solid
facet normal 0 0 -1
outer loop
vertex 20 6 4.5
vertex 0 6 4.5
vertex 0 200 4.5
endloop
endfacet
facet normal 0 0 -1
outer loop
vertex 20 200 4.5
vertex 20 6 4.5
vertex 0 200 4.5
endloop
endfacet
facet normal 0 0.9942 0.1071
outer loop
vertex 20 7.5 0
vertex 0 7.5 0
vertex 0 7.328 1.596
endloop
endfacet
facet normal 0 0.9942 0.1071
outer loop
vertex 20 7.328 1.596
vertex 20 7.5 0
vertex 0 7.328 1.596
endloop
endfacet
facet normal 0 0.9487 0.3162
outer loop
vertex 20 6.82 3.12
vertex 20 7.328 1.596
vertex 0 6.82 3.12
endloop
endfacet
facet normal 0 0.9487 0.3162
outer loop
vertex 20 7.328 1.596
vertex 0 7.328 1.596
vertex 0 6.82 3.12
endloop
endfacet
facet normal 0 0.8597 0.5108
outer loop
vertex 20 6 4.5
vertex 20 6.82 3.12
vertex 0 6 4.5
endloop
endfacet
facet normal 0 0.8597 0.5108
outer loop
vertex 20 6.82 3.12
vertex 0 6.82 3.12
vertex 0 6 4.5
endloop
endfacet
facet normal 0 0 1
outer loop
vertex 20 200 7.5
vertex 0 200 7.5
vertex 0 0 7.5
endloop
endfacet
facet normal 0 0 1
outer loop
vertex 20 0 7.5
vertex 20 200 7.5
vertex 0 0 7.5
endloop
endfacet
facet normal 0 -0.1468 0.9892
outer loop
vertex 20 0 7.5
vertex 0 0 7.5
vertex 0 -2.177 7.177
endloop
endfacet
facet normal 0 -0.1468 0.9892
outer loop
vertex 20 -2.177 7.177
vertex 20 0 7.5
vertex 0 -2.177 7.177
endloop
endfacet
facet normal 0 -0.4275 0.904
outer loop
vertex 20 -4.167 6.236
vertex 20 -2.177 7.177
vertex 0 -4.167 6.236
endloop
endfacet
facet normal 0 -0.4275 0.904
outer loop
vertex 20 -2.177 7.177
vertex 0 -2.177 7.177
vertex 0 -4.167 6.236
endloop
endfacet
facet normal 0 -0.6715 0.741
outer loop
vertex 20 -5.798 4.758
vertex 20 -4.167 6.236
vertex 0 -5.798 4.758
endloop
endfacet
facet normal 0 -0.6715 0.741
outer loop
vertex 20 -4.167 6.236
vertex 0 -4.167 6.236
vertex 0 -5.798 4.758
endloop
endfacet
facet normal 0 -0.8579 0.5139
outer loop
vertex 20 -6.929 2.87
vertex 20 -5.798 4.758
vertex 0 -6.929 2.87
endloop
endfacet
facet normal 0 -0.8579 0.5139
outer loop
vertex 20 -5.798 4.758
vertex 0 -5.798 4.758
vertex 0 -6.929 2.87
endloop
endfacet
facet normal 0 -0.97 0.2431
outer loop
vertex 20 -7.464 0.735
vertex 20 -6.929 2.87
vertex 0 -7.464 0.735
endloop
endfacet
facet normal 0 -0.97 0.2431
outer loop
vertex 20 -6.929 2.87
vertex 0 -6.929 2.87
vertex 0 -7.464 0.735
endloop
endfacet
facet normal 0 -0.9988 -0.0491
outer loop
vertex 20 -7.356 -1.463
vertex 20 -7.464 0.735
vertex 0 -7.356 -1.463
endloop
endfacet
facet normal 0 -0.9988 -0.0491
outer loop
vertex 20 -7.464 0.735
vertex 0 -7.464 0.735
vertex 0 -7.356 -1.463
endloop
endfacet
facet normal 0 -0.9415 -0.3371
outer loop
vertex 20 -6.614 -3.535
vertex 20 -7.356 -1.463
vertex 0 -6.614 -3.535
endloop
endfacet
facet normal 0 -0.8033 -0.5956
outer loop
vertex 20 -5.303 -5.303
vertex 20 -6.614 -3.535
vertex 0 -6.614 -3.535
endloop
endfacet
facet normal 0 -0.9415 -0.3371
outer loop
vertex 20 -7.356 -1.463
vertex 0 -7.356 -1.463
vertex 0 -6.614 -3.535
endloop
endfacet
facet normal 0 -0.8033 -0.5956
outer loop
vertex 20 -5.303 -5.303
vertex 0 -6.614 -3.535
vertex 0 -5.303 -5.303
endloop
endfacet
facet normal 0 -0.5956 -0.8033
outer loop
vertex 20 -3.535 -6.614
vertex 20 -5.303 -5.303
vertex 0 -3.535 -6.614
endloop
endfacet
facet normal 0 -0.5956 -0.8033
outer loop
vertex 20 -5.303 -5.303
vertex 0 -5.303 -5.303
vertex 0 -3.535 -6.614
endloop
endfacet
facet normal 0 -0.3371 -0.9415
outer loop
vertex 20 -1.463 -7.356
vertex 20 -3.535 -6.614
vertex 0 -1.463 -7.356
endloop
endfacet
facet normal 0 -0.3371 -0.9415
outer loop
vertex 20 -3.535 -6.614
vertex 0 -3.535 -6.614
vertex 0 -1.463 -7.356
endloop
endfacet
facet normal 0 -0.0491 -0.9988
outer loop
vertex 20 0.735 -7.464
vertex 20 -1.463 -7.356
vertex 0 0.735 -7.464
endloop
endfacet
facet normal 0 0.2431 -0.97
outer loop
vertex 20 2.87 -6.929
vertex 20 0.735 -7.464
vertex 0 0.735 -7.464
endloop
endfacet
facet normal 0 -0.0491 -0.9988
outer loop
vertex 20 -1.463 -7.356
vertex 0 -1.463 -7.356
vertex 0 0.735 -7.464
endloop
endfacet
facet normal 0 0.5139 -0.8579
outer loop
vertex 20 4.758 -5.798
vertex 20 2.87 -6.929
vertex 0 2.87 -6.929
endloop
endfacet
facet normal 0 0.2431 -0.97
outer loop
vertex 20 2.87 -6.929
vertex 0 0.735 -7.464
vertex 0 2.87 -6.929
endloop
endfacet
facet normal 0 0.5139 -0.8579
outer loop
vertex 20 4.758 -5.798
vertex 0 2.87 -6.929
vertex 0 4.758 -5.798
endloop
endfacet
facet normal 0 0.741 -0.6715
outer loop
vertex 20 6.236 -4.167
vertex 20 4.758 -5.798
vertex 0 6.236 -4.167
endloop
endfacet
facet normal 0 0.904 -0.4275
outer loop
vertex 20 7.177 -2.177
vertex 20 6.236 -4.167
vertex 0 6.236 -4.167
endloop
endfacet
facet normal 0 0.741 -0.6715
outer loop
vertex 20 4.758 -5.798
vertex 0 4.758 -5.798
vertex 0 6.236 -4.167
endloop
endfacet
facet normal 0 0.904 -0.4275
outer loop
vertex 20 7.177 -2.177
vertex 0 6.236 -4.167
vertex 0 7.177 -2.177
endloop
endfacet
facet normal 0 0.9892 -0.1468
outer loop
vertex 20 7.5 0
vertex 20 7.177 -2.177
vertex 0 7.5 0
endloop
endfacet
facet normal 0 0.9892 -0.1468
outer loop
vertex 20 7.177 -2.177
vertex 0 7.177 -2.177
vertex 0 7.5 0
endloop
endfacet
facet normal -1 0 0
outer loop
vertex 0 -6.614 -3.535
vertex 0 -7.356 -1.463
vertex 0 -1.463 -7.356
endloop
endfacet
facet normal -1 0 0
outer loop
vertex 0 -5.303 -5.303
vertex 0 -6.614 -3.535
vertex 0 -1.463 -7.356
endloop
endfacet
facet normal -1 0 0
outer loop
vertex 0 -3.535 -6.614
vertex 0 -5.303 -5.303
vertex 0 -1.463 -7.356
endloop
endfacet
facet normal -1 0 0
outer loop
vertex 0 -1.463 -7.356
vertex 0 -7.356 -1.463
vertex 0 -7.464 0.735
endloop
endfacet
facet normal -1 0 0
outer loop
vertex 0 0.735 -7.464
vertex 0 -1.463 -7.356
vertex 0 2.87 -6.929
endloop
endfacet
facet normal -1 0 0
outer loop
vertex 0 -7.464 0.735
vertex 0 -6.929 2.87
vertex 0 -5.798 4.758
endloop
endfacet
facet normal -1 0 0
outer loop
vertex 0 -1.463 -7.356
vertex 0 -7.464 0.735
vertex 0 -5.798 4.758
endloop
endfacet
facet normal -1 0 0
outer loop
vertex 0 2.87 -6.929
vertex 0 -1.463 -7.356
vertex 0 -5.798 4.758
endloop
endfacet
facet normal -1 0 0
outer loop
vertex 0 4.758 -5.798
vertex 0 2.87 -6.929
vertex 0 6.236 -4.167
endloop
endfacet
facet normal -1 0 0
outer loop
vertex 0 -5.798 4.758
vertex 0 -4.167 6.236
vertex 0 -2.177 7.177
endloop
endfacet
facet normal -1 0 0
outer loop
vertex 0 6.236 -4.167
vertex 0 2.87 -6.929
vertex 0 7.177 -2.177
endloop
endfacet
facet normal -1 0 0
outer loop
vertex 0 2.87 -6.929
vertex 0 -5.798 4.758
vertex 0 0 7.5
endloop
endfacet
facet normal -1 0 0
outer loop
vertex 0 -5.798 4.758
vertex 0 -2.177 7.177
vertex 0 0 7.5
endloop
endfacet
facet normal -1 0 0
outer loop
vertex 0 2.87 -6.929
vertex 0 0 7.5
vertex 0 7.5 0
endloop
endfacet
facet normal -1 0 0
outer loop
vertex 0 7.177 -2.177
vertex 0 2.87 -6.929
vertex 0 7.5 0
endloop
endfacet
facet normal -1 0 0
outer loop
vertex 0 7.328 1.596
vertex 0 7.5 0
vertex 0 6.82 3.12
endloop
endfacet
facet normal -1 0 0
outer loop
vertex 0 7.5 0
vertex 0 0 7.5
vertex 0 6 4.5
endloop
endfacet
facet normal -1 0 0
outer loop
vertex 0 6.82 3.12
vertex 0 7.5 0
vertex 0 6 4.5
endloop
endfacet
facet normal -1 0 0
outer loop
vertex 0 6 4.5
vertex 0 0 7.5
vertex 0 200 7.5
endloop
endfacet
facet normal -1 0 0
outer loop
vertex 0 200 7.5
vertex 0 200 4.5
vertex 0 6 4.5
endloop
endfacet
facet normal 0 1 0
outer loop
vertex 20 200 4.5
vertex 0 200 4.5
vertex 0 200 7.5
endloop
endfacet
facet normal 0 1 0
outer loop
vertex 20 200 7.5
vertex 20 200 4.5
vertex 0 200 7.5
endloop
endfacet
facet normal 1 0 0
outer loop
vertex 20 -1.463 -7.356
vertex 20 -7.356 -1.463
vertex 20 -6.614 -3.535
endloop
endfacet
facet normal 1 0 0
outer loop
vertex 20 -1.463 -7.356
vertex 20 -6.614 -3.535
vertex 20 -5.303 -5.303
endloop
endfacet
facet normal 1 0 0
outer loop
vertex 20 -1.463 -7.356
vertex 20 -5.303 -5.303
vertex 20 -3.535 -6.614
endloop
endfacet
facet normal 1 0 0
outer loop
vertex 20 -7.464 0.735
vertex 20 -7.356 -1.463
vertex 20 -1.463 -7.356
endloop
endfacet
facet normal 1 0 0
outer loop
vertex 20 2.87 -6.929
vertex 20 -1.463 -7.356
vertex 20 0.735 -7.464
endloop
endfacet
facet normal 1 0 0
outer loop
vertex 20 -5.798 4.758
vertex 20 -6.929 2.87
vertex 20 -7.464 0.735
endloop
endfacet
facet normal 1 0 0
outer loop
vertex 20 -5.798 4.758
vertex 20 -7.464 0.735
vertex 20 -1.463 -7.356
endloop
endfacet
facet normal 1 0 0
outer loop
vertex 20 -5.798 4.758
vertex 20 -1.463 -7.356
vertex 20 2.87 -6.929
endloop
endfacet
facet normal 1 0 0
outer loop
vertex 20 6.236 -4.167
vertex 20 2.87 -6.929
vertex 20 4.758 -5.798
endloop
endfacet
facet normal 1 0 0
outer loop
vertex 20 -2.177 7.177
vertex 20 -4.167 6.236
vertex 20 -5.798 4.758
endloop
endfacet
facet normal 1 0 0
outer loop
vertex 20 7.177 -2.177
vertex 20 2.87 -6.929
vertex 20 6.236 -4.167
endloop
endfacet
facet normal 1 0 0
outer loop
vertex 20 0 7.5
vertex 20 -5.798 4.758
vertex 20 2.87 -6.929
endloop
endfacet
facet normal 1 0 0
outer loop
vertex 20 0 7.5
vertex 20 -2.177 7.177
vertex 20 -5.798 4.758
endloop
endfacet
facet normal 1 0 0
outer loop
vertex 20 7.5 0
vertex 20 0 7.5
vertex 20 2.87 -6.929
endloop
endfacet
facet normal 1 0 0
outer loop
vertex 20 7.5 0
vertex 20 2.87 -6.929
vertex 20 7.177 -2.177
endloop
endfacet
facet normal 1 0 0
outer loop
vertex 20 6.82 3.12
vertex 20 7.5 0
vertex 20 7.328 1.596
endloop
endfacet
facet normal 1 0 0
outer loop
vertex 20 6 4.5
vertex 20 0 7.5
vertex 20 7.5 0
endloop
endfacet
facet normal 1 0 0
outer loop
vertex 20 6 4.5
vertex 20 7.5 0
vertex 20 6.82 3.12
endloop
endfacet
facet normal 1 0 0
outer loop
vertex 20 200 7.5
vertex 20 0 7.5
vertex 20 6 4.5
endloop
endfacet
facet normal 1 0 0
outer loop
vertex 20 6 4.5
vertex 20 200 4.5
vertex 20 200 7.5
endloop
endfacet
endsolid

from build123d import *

# Parameters (mm, degrees)
F1_DEPTH = 20


with BuildPart() as f1:
    # F0 (on Right) → F1 (new body)
    with BuildSketch(Plane.YZ):
        with BuildLine():
            Line((200, 7.5), (0, 7.5))
            ThreePointArc((0, 7.5), (3.354102, 6.708204), (6, 4.5))
            Line((6, 4.5), (200, 4.5))
            Line((200, 4.5), (200, 7.5))
        make_face()
        with BuildLine():
            ThreePointArc((6, 4.5), (3.354102, 6.708204), (0, 7.5))
            Line((0, 7.5), (0, 4.5))
            Line((0, 4.5), (6, 4.5))
        make_face()
        with BuildLine():
            Line((0, 4.5), (0, 7.5))
            ThreePointArc((0, 7.5), (-5.303301, -5.303301), (7.5, 0))
            ThreePointArc((7.5, 0), (7.115125, 2.371708), (6, 4.5))
            Line((6, 4.5), (0, 4.5))
        make_face()
    extrude(amount=F1_DEPTH)


solid = f1.part
